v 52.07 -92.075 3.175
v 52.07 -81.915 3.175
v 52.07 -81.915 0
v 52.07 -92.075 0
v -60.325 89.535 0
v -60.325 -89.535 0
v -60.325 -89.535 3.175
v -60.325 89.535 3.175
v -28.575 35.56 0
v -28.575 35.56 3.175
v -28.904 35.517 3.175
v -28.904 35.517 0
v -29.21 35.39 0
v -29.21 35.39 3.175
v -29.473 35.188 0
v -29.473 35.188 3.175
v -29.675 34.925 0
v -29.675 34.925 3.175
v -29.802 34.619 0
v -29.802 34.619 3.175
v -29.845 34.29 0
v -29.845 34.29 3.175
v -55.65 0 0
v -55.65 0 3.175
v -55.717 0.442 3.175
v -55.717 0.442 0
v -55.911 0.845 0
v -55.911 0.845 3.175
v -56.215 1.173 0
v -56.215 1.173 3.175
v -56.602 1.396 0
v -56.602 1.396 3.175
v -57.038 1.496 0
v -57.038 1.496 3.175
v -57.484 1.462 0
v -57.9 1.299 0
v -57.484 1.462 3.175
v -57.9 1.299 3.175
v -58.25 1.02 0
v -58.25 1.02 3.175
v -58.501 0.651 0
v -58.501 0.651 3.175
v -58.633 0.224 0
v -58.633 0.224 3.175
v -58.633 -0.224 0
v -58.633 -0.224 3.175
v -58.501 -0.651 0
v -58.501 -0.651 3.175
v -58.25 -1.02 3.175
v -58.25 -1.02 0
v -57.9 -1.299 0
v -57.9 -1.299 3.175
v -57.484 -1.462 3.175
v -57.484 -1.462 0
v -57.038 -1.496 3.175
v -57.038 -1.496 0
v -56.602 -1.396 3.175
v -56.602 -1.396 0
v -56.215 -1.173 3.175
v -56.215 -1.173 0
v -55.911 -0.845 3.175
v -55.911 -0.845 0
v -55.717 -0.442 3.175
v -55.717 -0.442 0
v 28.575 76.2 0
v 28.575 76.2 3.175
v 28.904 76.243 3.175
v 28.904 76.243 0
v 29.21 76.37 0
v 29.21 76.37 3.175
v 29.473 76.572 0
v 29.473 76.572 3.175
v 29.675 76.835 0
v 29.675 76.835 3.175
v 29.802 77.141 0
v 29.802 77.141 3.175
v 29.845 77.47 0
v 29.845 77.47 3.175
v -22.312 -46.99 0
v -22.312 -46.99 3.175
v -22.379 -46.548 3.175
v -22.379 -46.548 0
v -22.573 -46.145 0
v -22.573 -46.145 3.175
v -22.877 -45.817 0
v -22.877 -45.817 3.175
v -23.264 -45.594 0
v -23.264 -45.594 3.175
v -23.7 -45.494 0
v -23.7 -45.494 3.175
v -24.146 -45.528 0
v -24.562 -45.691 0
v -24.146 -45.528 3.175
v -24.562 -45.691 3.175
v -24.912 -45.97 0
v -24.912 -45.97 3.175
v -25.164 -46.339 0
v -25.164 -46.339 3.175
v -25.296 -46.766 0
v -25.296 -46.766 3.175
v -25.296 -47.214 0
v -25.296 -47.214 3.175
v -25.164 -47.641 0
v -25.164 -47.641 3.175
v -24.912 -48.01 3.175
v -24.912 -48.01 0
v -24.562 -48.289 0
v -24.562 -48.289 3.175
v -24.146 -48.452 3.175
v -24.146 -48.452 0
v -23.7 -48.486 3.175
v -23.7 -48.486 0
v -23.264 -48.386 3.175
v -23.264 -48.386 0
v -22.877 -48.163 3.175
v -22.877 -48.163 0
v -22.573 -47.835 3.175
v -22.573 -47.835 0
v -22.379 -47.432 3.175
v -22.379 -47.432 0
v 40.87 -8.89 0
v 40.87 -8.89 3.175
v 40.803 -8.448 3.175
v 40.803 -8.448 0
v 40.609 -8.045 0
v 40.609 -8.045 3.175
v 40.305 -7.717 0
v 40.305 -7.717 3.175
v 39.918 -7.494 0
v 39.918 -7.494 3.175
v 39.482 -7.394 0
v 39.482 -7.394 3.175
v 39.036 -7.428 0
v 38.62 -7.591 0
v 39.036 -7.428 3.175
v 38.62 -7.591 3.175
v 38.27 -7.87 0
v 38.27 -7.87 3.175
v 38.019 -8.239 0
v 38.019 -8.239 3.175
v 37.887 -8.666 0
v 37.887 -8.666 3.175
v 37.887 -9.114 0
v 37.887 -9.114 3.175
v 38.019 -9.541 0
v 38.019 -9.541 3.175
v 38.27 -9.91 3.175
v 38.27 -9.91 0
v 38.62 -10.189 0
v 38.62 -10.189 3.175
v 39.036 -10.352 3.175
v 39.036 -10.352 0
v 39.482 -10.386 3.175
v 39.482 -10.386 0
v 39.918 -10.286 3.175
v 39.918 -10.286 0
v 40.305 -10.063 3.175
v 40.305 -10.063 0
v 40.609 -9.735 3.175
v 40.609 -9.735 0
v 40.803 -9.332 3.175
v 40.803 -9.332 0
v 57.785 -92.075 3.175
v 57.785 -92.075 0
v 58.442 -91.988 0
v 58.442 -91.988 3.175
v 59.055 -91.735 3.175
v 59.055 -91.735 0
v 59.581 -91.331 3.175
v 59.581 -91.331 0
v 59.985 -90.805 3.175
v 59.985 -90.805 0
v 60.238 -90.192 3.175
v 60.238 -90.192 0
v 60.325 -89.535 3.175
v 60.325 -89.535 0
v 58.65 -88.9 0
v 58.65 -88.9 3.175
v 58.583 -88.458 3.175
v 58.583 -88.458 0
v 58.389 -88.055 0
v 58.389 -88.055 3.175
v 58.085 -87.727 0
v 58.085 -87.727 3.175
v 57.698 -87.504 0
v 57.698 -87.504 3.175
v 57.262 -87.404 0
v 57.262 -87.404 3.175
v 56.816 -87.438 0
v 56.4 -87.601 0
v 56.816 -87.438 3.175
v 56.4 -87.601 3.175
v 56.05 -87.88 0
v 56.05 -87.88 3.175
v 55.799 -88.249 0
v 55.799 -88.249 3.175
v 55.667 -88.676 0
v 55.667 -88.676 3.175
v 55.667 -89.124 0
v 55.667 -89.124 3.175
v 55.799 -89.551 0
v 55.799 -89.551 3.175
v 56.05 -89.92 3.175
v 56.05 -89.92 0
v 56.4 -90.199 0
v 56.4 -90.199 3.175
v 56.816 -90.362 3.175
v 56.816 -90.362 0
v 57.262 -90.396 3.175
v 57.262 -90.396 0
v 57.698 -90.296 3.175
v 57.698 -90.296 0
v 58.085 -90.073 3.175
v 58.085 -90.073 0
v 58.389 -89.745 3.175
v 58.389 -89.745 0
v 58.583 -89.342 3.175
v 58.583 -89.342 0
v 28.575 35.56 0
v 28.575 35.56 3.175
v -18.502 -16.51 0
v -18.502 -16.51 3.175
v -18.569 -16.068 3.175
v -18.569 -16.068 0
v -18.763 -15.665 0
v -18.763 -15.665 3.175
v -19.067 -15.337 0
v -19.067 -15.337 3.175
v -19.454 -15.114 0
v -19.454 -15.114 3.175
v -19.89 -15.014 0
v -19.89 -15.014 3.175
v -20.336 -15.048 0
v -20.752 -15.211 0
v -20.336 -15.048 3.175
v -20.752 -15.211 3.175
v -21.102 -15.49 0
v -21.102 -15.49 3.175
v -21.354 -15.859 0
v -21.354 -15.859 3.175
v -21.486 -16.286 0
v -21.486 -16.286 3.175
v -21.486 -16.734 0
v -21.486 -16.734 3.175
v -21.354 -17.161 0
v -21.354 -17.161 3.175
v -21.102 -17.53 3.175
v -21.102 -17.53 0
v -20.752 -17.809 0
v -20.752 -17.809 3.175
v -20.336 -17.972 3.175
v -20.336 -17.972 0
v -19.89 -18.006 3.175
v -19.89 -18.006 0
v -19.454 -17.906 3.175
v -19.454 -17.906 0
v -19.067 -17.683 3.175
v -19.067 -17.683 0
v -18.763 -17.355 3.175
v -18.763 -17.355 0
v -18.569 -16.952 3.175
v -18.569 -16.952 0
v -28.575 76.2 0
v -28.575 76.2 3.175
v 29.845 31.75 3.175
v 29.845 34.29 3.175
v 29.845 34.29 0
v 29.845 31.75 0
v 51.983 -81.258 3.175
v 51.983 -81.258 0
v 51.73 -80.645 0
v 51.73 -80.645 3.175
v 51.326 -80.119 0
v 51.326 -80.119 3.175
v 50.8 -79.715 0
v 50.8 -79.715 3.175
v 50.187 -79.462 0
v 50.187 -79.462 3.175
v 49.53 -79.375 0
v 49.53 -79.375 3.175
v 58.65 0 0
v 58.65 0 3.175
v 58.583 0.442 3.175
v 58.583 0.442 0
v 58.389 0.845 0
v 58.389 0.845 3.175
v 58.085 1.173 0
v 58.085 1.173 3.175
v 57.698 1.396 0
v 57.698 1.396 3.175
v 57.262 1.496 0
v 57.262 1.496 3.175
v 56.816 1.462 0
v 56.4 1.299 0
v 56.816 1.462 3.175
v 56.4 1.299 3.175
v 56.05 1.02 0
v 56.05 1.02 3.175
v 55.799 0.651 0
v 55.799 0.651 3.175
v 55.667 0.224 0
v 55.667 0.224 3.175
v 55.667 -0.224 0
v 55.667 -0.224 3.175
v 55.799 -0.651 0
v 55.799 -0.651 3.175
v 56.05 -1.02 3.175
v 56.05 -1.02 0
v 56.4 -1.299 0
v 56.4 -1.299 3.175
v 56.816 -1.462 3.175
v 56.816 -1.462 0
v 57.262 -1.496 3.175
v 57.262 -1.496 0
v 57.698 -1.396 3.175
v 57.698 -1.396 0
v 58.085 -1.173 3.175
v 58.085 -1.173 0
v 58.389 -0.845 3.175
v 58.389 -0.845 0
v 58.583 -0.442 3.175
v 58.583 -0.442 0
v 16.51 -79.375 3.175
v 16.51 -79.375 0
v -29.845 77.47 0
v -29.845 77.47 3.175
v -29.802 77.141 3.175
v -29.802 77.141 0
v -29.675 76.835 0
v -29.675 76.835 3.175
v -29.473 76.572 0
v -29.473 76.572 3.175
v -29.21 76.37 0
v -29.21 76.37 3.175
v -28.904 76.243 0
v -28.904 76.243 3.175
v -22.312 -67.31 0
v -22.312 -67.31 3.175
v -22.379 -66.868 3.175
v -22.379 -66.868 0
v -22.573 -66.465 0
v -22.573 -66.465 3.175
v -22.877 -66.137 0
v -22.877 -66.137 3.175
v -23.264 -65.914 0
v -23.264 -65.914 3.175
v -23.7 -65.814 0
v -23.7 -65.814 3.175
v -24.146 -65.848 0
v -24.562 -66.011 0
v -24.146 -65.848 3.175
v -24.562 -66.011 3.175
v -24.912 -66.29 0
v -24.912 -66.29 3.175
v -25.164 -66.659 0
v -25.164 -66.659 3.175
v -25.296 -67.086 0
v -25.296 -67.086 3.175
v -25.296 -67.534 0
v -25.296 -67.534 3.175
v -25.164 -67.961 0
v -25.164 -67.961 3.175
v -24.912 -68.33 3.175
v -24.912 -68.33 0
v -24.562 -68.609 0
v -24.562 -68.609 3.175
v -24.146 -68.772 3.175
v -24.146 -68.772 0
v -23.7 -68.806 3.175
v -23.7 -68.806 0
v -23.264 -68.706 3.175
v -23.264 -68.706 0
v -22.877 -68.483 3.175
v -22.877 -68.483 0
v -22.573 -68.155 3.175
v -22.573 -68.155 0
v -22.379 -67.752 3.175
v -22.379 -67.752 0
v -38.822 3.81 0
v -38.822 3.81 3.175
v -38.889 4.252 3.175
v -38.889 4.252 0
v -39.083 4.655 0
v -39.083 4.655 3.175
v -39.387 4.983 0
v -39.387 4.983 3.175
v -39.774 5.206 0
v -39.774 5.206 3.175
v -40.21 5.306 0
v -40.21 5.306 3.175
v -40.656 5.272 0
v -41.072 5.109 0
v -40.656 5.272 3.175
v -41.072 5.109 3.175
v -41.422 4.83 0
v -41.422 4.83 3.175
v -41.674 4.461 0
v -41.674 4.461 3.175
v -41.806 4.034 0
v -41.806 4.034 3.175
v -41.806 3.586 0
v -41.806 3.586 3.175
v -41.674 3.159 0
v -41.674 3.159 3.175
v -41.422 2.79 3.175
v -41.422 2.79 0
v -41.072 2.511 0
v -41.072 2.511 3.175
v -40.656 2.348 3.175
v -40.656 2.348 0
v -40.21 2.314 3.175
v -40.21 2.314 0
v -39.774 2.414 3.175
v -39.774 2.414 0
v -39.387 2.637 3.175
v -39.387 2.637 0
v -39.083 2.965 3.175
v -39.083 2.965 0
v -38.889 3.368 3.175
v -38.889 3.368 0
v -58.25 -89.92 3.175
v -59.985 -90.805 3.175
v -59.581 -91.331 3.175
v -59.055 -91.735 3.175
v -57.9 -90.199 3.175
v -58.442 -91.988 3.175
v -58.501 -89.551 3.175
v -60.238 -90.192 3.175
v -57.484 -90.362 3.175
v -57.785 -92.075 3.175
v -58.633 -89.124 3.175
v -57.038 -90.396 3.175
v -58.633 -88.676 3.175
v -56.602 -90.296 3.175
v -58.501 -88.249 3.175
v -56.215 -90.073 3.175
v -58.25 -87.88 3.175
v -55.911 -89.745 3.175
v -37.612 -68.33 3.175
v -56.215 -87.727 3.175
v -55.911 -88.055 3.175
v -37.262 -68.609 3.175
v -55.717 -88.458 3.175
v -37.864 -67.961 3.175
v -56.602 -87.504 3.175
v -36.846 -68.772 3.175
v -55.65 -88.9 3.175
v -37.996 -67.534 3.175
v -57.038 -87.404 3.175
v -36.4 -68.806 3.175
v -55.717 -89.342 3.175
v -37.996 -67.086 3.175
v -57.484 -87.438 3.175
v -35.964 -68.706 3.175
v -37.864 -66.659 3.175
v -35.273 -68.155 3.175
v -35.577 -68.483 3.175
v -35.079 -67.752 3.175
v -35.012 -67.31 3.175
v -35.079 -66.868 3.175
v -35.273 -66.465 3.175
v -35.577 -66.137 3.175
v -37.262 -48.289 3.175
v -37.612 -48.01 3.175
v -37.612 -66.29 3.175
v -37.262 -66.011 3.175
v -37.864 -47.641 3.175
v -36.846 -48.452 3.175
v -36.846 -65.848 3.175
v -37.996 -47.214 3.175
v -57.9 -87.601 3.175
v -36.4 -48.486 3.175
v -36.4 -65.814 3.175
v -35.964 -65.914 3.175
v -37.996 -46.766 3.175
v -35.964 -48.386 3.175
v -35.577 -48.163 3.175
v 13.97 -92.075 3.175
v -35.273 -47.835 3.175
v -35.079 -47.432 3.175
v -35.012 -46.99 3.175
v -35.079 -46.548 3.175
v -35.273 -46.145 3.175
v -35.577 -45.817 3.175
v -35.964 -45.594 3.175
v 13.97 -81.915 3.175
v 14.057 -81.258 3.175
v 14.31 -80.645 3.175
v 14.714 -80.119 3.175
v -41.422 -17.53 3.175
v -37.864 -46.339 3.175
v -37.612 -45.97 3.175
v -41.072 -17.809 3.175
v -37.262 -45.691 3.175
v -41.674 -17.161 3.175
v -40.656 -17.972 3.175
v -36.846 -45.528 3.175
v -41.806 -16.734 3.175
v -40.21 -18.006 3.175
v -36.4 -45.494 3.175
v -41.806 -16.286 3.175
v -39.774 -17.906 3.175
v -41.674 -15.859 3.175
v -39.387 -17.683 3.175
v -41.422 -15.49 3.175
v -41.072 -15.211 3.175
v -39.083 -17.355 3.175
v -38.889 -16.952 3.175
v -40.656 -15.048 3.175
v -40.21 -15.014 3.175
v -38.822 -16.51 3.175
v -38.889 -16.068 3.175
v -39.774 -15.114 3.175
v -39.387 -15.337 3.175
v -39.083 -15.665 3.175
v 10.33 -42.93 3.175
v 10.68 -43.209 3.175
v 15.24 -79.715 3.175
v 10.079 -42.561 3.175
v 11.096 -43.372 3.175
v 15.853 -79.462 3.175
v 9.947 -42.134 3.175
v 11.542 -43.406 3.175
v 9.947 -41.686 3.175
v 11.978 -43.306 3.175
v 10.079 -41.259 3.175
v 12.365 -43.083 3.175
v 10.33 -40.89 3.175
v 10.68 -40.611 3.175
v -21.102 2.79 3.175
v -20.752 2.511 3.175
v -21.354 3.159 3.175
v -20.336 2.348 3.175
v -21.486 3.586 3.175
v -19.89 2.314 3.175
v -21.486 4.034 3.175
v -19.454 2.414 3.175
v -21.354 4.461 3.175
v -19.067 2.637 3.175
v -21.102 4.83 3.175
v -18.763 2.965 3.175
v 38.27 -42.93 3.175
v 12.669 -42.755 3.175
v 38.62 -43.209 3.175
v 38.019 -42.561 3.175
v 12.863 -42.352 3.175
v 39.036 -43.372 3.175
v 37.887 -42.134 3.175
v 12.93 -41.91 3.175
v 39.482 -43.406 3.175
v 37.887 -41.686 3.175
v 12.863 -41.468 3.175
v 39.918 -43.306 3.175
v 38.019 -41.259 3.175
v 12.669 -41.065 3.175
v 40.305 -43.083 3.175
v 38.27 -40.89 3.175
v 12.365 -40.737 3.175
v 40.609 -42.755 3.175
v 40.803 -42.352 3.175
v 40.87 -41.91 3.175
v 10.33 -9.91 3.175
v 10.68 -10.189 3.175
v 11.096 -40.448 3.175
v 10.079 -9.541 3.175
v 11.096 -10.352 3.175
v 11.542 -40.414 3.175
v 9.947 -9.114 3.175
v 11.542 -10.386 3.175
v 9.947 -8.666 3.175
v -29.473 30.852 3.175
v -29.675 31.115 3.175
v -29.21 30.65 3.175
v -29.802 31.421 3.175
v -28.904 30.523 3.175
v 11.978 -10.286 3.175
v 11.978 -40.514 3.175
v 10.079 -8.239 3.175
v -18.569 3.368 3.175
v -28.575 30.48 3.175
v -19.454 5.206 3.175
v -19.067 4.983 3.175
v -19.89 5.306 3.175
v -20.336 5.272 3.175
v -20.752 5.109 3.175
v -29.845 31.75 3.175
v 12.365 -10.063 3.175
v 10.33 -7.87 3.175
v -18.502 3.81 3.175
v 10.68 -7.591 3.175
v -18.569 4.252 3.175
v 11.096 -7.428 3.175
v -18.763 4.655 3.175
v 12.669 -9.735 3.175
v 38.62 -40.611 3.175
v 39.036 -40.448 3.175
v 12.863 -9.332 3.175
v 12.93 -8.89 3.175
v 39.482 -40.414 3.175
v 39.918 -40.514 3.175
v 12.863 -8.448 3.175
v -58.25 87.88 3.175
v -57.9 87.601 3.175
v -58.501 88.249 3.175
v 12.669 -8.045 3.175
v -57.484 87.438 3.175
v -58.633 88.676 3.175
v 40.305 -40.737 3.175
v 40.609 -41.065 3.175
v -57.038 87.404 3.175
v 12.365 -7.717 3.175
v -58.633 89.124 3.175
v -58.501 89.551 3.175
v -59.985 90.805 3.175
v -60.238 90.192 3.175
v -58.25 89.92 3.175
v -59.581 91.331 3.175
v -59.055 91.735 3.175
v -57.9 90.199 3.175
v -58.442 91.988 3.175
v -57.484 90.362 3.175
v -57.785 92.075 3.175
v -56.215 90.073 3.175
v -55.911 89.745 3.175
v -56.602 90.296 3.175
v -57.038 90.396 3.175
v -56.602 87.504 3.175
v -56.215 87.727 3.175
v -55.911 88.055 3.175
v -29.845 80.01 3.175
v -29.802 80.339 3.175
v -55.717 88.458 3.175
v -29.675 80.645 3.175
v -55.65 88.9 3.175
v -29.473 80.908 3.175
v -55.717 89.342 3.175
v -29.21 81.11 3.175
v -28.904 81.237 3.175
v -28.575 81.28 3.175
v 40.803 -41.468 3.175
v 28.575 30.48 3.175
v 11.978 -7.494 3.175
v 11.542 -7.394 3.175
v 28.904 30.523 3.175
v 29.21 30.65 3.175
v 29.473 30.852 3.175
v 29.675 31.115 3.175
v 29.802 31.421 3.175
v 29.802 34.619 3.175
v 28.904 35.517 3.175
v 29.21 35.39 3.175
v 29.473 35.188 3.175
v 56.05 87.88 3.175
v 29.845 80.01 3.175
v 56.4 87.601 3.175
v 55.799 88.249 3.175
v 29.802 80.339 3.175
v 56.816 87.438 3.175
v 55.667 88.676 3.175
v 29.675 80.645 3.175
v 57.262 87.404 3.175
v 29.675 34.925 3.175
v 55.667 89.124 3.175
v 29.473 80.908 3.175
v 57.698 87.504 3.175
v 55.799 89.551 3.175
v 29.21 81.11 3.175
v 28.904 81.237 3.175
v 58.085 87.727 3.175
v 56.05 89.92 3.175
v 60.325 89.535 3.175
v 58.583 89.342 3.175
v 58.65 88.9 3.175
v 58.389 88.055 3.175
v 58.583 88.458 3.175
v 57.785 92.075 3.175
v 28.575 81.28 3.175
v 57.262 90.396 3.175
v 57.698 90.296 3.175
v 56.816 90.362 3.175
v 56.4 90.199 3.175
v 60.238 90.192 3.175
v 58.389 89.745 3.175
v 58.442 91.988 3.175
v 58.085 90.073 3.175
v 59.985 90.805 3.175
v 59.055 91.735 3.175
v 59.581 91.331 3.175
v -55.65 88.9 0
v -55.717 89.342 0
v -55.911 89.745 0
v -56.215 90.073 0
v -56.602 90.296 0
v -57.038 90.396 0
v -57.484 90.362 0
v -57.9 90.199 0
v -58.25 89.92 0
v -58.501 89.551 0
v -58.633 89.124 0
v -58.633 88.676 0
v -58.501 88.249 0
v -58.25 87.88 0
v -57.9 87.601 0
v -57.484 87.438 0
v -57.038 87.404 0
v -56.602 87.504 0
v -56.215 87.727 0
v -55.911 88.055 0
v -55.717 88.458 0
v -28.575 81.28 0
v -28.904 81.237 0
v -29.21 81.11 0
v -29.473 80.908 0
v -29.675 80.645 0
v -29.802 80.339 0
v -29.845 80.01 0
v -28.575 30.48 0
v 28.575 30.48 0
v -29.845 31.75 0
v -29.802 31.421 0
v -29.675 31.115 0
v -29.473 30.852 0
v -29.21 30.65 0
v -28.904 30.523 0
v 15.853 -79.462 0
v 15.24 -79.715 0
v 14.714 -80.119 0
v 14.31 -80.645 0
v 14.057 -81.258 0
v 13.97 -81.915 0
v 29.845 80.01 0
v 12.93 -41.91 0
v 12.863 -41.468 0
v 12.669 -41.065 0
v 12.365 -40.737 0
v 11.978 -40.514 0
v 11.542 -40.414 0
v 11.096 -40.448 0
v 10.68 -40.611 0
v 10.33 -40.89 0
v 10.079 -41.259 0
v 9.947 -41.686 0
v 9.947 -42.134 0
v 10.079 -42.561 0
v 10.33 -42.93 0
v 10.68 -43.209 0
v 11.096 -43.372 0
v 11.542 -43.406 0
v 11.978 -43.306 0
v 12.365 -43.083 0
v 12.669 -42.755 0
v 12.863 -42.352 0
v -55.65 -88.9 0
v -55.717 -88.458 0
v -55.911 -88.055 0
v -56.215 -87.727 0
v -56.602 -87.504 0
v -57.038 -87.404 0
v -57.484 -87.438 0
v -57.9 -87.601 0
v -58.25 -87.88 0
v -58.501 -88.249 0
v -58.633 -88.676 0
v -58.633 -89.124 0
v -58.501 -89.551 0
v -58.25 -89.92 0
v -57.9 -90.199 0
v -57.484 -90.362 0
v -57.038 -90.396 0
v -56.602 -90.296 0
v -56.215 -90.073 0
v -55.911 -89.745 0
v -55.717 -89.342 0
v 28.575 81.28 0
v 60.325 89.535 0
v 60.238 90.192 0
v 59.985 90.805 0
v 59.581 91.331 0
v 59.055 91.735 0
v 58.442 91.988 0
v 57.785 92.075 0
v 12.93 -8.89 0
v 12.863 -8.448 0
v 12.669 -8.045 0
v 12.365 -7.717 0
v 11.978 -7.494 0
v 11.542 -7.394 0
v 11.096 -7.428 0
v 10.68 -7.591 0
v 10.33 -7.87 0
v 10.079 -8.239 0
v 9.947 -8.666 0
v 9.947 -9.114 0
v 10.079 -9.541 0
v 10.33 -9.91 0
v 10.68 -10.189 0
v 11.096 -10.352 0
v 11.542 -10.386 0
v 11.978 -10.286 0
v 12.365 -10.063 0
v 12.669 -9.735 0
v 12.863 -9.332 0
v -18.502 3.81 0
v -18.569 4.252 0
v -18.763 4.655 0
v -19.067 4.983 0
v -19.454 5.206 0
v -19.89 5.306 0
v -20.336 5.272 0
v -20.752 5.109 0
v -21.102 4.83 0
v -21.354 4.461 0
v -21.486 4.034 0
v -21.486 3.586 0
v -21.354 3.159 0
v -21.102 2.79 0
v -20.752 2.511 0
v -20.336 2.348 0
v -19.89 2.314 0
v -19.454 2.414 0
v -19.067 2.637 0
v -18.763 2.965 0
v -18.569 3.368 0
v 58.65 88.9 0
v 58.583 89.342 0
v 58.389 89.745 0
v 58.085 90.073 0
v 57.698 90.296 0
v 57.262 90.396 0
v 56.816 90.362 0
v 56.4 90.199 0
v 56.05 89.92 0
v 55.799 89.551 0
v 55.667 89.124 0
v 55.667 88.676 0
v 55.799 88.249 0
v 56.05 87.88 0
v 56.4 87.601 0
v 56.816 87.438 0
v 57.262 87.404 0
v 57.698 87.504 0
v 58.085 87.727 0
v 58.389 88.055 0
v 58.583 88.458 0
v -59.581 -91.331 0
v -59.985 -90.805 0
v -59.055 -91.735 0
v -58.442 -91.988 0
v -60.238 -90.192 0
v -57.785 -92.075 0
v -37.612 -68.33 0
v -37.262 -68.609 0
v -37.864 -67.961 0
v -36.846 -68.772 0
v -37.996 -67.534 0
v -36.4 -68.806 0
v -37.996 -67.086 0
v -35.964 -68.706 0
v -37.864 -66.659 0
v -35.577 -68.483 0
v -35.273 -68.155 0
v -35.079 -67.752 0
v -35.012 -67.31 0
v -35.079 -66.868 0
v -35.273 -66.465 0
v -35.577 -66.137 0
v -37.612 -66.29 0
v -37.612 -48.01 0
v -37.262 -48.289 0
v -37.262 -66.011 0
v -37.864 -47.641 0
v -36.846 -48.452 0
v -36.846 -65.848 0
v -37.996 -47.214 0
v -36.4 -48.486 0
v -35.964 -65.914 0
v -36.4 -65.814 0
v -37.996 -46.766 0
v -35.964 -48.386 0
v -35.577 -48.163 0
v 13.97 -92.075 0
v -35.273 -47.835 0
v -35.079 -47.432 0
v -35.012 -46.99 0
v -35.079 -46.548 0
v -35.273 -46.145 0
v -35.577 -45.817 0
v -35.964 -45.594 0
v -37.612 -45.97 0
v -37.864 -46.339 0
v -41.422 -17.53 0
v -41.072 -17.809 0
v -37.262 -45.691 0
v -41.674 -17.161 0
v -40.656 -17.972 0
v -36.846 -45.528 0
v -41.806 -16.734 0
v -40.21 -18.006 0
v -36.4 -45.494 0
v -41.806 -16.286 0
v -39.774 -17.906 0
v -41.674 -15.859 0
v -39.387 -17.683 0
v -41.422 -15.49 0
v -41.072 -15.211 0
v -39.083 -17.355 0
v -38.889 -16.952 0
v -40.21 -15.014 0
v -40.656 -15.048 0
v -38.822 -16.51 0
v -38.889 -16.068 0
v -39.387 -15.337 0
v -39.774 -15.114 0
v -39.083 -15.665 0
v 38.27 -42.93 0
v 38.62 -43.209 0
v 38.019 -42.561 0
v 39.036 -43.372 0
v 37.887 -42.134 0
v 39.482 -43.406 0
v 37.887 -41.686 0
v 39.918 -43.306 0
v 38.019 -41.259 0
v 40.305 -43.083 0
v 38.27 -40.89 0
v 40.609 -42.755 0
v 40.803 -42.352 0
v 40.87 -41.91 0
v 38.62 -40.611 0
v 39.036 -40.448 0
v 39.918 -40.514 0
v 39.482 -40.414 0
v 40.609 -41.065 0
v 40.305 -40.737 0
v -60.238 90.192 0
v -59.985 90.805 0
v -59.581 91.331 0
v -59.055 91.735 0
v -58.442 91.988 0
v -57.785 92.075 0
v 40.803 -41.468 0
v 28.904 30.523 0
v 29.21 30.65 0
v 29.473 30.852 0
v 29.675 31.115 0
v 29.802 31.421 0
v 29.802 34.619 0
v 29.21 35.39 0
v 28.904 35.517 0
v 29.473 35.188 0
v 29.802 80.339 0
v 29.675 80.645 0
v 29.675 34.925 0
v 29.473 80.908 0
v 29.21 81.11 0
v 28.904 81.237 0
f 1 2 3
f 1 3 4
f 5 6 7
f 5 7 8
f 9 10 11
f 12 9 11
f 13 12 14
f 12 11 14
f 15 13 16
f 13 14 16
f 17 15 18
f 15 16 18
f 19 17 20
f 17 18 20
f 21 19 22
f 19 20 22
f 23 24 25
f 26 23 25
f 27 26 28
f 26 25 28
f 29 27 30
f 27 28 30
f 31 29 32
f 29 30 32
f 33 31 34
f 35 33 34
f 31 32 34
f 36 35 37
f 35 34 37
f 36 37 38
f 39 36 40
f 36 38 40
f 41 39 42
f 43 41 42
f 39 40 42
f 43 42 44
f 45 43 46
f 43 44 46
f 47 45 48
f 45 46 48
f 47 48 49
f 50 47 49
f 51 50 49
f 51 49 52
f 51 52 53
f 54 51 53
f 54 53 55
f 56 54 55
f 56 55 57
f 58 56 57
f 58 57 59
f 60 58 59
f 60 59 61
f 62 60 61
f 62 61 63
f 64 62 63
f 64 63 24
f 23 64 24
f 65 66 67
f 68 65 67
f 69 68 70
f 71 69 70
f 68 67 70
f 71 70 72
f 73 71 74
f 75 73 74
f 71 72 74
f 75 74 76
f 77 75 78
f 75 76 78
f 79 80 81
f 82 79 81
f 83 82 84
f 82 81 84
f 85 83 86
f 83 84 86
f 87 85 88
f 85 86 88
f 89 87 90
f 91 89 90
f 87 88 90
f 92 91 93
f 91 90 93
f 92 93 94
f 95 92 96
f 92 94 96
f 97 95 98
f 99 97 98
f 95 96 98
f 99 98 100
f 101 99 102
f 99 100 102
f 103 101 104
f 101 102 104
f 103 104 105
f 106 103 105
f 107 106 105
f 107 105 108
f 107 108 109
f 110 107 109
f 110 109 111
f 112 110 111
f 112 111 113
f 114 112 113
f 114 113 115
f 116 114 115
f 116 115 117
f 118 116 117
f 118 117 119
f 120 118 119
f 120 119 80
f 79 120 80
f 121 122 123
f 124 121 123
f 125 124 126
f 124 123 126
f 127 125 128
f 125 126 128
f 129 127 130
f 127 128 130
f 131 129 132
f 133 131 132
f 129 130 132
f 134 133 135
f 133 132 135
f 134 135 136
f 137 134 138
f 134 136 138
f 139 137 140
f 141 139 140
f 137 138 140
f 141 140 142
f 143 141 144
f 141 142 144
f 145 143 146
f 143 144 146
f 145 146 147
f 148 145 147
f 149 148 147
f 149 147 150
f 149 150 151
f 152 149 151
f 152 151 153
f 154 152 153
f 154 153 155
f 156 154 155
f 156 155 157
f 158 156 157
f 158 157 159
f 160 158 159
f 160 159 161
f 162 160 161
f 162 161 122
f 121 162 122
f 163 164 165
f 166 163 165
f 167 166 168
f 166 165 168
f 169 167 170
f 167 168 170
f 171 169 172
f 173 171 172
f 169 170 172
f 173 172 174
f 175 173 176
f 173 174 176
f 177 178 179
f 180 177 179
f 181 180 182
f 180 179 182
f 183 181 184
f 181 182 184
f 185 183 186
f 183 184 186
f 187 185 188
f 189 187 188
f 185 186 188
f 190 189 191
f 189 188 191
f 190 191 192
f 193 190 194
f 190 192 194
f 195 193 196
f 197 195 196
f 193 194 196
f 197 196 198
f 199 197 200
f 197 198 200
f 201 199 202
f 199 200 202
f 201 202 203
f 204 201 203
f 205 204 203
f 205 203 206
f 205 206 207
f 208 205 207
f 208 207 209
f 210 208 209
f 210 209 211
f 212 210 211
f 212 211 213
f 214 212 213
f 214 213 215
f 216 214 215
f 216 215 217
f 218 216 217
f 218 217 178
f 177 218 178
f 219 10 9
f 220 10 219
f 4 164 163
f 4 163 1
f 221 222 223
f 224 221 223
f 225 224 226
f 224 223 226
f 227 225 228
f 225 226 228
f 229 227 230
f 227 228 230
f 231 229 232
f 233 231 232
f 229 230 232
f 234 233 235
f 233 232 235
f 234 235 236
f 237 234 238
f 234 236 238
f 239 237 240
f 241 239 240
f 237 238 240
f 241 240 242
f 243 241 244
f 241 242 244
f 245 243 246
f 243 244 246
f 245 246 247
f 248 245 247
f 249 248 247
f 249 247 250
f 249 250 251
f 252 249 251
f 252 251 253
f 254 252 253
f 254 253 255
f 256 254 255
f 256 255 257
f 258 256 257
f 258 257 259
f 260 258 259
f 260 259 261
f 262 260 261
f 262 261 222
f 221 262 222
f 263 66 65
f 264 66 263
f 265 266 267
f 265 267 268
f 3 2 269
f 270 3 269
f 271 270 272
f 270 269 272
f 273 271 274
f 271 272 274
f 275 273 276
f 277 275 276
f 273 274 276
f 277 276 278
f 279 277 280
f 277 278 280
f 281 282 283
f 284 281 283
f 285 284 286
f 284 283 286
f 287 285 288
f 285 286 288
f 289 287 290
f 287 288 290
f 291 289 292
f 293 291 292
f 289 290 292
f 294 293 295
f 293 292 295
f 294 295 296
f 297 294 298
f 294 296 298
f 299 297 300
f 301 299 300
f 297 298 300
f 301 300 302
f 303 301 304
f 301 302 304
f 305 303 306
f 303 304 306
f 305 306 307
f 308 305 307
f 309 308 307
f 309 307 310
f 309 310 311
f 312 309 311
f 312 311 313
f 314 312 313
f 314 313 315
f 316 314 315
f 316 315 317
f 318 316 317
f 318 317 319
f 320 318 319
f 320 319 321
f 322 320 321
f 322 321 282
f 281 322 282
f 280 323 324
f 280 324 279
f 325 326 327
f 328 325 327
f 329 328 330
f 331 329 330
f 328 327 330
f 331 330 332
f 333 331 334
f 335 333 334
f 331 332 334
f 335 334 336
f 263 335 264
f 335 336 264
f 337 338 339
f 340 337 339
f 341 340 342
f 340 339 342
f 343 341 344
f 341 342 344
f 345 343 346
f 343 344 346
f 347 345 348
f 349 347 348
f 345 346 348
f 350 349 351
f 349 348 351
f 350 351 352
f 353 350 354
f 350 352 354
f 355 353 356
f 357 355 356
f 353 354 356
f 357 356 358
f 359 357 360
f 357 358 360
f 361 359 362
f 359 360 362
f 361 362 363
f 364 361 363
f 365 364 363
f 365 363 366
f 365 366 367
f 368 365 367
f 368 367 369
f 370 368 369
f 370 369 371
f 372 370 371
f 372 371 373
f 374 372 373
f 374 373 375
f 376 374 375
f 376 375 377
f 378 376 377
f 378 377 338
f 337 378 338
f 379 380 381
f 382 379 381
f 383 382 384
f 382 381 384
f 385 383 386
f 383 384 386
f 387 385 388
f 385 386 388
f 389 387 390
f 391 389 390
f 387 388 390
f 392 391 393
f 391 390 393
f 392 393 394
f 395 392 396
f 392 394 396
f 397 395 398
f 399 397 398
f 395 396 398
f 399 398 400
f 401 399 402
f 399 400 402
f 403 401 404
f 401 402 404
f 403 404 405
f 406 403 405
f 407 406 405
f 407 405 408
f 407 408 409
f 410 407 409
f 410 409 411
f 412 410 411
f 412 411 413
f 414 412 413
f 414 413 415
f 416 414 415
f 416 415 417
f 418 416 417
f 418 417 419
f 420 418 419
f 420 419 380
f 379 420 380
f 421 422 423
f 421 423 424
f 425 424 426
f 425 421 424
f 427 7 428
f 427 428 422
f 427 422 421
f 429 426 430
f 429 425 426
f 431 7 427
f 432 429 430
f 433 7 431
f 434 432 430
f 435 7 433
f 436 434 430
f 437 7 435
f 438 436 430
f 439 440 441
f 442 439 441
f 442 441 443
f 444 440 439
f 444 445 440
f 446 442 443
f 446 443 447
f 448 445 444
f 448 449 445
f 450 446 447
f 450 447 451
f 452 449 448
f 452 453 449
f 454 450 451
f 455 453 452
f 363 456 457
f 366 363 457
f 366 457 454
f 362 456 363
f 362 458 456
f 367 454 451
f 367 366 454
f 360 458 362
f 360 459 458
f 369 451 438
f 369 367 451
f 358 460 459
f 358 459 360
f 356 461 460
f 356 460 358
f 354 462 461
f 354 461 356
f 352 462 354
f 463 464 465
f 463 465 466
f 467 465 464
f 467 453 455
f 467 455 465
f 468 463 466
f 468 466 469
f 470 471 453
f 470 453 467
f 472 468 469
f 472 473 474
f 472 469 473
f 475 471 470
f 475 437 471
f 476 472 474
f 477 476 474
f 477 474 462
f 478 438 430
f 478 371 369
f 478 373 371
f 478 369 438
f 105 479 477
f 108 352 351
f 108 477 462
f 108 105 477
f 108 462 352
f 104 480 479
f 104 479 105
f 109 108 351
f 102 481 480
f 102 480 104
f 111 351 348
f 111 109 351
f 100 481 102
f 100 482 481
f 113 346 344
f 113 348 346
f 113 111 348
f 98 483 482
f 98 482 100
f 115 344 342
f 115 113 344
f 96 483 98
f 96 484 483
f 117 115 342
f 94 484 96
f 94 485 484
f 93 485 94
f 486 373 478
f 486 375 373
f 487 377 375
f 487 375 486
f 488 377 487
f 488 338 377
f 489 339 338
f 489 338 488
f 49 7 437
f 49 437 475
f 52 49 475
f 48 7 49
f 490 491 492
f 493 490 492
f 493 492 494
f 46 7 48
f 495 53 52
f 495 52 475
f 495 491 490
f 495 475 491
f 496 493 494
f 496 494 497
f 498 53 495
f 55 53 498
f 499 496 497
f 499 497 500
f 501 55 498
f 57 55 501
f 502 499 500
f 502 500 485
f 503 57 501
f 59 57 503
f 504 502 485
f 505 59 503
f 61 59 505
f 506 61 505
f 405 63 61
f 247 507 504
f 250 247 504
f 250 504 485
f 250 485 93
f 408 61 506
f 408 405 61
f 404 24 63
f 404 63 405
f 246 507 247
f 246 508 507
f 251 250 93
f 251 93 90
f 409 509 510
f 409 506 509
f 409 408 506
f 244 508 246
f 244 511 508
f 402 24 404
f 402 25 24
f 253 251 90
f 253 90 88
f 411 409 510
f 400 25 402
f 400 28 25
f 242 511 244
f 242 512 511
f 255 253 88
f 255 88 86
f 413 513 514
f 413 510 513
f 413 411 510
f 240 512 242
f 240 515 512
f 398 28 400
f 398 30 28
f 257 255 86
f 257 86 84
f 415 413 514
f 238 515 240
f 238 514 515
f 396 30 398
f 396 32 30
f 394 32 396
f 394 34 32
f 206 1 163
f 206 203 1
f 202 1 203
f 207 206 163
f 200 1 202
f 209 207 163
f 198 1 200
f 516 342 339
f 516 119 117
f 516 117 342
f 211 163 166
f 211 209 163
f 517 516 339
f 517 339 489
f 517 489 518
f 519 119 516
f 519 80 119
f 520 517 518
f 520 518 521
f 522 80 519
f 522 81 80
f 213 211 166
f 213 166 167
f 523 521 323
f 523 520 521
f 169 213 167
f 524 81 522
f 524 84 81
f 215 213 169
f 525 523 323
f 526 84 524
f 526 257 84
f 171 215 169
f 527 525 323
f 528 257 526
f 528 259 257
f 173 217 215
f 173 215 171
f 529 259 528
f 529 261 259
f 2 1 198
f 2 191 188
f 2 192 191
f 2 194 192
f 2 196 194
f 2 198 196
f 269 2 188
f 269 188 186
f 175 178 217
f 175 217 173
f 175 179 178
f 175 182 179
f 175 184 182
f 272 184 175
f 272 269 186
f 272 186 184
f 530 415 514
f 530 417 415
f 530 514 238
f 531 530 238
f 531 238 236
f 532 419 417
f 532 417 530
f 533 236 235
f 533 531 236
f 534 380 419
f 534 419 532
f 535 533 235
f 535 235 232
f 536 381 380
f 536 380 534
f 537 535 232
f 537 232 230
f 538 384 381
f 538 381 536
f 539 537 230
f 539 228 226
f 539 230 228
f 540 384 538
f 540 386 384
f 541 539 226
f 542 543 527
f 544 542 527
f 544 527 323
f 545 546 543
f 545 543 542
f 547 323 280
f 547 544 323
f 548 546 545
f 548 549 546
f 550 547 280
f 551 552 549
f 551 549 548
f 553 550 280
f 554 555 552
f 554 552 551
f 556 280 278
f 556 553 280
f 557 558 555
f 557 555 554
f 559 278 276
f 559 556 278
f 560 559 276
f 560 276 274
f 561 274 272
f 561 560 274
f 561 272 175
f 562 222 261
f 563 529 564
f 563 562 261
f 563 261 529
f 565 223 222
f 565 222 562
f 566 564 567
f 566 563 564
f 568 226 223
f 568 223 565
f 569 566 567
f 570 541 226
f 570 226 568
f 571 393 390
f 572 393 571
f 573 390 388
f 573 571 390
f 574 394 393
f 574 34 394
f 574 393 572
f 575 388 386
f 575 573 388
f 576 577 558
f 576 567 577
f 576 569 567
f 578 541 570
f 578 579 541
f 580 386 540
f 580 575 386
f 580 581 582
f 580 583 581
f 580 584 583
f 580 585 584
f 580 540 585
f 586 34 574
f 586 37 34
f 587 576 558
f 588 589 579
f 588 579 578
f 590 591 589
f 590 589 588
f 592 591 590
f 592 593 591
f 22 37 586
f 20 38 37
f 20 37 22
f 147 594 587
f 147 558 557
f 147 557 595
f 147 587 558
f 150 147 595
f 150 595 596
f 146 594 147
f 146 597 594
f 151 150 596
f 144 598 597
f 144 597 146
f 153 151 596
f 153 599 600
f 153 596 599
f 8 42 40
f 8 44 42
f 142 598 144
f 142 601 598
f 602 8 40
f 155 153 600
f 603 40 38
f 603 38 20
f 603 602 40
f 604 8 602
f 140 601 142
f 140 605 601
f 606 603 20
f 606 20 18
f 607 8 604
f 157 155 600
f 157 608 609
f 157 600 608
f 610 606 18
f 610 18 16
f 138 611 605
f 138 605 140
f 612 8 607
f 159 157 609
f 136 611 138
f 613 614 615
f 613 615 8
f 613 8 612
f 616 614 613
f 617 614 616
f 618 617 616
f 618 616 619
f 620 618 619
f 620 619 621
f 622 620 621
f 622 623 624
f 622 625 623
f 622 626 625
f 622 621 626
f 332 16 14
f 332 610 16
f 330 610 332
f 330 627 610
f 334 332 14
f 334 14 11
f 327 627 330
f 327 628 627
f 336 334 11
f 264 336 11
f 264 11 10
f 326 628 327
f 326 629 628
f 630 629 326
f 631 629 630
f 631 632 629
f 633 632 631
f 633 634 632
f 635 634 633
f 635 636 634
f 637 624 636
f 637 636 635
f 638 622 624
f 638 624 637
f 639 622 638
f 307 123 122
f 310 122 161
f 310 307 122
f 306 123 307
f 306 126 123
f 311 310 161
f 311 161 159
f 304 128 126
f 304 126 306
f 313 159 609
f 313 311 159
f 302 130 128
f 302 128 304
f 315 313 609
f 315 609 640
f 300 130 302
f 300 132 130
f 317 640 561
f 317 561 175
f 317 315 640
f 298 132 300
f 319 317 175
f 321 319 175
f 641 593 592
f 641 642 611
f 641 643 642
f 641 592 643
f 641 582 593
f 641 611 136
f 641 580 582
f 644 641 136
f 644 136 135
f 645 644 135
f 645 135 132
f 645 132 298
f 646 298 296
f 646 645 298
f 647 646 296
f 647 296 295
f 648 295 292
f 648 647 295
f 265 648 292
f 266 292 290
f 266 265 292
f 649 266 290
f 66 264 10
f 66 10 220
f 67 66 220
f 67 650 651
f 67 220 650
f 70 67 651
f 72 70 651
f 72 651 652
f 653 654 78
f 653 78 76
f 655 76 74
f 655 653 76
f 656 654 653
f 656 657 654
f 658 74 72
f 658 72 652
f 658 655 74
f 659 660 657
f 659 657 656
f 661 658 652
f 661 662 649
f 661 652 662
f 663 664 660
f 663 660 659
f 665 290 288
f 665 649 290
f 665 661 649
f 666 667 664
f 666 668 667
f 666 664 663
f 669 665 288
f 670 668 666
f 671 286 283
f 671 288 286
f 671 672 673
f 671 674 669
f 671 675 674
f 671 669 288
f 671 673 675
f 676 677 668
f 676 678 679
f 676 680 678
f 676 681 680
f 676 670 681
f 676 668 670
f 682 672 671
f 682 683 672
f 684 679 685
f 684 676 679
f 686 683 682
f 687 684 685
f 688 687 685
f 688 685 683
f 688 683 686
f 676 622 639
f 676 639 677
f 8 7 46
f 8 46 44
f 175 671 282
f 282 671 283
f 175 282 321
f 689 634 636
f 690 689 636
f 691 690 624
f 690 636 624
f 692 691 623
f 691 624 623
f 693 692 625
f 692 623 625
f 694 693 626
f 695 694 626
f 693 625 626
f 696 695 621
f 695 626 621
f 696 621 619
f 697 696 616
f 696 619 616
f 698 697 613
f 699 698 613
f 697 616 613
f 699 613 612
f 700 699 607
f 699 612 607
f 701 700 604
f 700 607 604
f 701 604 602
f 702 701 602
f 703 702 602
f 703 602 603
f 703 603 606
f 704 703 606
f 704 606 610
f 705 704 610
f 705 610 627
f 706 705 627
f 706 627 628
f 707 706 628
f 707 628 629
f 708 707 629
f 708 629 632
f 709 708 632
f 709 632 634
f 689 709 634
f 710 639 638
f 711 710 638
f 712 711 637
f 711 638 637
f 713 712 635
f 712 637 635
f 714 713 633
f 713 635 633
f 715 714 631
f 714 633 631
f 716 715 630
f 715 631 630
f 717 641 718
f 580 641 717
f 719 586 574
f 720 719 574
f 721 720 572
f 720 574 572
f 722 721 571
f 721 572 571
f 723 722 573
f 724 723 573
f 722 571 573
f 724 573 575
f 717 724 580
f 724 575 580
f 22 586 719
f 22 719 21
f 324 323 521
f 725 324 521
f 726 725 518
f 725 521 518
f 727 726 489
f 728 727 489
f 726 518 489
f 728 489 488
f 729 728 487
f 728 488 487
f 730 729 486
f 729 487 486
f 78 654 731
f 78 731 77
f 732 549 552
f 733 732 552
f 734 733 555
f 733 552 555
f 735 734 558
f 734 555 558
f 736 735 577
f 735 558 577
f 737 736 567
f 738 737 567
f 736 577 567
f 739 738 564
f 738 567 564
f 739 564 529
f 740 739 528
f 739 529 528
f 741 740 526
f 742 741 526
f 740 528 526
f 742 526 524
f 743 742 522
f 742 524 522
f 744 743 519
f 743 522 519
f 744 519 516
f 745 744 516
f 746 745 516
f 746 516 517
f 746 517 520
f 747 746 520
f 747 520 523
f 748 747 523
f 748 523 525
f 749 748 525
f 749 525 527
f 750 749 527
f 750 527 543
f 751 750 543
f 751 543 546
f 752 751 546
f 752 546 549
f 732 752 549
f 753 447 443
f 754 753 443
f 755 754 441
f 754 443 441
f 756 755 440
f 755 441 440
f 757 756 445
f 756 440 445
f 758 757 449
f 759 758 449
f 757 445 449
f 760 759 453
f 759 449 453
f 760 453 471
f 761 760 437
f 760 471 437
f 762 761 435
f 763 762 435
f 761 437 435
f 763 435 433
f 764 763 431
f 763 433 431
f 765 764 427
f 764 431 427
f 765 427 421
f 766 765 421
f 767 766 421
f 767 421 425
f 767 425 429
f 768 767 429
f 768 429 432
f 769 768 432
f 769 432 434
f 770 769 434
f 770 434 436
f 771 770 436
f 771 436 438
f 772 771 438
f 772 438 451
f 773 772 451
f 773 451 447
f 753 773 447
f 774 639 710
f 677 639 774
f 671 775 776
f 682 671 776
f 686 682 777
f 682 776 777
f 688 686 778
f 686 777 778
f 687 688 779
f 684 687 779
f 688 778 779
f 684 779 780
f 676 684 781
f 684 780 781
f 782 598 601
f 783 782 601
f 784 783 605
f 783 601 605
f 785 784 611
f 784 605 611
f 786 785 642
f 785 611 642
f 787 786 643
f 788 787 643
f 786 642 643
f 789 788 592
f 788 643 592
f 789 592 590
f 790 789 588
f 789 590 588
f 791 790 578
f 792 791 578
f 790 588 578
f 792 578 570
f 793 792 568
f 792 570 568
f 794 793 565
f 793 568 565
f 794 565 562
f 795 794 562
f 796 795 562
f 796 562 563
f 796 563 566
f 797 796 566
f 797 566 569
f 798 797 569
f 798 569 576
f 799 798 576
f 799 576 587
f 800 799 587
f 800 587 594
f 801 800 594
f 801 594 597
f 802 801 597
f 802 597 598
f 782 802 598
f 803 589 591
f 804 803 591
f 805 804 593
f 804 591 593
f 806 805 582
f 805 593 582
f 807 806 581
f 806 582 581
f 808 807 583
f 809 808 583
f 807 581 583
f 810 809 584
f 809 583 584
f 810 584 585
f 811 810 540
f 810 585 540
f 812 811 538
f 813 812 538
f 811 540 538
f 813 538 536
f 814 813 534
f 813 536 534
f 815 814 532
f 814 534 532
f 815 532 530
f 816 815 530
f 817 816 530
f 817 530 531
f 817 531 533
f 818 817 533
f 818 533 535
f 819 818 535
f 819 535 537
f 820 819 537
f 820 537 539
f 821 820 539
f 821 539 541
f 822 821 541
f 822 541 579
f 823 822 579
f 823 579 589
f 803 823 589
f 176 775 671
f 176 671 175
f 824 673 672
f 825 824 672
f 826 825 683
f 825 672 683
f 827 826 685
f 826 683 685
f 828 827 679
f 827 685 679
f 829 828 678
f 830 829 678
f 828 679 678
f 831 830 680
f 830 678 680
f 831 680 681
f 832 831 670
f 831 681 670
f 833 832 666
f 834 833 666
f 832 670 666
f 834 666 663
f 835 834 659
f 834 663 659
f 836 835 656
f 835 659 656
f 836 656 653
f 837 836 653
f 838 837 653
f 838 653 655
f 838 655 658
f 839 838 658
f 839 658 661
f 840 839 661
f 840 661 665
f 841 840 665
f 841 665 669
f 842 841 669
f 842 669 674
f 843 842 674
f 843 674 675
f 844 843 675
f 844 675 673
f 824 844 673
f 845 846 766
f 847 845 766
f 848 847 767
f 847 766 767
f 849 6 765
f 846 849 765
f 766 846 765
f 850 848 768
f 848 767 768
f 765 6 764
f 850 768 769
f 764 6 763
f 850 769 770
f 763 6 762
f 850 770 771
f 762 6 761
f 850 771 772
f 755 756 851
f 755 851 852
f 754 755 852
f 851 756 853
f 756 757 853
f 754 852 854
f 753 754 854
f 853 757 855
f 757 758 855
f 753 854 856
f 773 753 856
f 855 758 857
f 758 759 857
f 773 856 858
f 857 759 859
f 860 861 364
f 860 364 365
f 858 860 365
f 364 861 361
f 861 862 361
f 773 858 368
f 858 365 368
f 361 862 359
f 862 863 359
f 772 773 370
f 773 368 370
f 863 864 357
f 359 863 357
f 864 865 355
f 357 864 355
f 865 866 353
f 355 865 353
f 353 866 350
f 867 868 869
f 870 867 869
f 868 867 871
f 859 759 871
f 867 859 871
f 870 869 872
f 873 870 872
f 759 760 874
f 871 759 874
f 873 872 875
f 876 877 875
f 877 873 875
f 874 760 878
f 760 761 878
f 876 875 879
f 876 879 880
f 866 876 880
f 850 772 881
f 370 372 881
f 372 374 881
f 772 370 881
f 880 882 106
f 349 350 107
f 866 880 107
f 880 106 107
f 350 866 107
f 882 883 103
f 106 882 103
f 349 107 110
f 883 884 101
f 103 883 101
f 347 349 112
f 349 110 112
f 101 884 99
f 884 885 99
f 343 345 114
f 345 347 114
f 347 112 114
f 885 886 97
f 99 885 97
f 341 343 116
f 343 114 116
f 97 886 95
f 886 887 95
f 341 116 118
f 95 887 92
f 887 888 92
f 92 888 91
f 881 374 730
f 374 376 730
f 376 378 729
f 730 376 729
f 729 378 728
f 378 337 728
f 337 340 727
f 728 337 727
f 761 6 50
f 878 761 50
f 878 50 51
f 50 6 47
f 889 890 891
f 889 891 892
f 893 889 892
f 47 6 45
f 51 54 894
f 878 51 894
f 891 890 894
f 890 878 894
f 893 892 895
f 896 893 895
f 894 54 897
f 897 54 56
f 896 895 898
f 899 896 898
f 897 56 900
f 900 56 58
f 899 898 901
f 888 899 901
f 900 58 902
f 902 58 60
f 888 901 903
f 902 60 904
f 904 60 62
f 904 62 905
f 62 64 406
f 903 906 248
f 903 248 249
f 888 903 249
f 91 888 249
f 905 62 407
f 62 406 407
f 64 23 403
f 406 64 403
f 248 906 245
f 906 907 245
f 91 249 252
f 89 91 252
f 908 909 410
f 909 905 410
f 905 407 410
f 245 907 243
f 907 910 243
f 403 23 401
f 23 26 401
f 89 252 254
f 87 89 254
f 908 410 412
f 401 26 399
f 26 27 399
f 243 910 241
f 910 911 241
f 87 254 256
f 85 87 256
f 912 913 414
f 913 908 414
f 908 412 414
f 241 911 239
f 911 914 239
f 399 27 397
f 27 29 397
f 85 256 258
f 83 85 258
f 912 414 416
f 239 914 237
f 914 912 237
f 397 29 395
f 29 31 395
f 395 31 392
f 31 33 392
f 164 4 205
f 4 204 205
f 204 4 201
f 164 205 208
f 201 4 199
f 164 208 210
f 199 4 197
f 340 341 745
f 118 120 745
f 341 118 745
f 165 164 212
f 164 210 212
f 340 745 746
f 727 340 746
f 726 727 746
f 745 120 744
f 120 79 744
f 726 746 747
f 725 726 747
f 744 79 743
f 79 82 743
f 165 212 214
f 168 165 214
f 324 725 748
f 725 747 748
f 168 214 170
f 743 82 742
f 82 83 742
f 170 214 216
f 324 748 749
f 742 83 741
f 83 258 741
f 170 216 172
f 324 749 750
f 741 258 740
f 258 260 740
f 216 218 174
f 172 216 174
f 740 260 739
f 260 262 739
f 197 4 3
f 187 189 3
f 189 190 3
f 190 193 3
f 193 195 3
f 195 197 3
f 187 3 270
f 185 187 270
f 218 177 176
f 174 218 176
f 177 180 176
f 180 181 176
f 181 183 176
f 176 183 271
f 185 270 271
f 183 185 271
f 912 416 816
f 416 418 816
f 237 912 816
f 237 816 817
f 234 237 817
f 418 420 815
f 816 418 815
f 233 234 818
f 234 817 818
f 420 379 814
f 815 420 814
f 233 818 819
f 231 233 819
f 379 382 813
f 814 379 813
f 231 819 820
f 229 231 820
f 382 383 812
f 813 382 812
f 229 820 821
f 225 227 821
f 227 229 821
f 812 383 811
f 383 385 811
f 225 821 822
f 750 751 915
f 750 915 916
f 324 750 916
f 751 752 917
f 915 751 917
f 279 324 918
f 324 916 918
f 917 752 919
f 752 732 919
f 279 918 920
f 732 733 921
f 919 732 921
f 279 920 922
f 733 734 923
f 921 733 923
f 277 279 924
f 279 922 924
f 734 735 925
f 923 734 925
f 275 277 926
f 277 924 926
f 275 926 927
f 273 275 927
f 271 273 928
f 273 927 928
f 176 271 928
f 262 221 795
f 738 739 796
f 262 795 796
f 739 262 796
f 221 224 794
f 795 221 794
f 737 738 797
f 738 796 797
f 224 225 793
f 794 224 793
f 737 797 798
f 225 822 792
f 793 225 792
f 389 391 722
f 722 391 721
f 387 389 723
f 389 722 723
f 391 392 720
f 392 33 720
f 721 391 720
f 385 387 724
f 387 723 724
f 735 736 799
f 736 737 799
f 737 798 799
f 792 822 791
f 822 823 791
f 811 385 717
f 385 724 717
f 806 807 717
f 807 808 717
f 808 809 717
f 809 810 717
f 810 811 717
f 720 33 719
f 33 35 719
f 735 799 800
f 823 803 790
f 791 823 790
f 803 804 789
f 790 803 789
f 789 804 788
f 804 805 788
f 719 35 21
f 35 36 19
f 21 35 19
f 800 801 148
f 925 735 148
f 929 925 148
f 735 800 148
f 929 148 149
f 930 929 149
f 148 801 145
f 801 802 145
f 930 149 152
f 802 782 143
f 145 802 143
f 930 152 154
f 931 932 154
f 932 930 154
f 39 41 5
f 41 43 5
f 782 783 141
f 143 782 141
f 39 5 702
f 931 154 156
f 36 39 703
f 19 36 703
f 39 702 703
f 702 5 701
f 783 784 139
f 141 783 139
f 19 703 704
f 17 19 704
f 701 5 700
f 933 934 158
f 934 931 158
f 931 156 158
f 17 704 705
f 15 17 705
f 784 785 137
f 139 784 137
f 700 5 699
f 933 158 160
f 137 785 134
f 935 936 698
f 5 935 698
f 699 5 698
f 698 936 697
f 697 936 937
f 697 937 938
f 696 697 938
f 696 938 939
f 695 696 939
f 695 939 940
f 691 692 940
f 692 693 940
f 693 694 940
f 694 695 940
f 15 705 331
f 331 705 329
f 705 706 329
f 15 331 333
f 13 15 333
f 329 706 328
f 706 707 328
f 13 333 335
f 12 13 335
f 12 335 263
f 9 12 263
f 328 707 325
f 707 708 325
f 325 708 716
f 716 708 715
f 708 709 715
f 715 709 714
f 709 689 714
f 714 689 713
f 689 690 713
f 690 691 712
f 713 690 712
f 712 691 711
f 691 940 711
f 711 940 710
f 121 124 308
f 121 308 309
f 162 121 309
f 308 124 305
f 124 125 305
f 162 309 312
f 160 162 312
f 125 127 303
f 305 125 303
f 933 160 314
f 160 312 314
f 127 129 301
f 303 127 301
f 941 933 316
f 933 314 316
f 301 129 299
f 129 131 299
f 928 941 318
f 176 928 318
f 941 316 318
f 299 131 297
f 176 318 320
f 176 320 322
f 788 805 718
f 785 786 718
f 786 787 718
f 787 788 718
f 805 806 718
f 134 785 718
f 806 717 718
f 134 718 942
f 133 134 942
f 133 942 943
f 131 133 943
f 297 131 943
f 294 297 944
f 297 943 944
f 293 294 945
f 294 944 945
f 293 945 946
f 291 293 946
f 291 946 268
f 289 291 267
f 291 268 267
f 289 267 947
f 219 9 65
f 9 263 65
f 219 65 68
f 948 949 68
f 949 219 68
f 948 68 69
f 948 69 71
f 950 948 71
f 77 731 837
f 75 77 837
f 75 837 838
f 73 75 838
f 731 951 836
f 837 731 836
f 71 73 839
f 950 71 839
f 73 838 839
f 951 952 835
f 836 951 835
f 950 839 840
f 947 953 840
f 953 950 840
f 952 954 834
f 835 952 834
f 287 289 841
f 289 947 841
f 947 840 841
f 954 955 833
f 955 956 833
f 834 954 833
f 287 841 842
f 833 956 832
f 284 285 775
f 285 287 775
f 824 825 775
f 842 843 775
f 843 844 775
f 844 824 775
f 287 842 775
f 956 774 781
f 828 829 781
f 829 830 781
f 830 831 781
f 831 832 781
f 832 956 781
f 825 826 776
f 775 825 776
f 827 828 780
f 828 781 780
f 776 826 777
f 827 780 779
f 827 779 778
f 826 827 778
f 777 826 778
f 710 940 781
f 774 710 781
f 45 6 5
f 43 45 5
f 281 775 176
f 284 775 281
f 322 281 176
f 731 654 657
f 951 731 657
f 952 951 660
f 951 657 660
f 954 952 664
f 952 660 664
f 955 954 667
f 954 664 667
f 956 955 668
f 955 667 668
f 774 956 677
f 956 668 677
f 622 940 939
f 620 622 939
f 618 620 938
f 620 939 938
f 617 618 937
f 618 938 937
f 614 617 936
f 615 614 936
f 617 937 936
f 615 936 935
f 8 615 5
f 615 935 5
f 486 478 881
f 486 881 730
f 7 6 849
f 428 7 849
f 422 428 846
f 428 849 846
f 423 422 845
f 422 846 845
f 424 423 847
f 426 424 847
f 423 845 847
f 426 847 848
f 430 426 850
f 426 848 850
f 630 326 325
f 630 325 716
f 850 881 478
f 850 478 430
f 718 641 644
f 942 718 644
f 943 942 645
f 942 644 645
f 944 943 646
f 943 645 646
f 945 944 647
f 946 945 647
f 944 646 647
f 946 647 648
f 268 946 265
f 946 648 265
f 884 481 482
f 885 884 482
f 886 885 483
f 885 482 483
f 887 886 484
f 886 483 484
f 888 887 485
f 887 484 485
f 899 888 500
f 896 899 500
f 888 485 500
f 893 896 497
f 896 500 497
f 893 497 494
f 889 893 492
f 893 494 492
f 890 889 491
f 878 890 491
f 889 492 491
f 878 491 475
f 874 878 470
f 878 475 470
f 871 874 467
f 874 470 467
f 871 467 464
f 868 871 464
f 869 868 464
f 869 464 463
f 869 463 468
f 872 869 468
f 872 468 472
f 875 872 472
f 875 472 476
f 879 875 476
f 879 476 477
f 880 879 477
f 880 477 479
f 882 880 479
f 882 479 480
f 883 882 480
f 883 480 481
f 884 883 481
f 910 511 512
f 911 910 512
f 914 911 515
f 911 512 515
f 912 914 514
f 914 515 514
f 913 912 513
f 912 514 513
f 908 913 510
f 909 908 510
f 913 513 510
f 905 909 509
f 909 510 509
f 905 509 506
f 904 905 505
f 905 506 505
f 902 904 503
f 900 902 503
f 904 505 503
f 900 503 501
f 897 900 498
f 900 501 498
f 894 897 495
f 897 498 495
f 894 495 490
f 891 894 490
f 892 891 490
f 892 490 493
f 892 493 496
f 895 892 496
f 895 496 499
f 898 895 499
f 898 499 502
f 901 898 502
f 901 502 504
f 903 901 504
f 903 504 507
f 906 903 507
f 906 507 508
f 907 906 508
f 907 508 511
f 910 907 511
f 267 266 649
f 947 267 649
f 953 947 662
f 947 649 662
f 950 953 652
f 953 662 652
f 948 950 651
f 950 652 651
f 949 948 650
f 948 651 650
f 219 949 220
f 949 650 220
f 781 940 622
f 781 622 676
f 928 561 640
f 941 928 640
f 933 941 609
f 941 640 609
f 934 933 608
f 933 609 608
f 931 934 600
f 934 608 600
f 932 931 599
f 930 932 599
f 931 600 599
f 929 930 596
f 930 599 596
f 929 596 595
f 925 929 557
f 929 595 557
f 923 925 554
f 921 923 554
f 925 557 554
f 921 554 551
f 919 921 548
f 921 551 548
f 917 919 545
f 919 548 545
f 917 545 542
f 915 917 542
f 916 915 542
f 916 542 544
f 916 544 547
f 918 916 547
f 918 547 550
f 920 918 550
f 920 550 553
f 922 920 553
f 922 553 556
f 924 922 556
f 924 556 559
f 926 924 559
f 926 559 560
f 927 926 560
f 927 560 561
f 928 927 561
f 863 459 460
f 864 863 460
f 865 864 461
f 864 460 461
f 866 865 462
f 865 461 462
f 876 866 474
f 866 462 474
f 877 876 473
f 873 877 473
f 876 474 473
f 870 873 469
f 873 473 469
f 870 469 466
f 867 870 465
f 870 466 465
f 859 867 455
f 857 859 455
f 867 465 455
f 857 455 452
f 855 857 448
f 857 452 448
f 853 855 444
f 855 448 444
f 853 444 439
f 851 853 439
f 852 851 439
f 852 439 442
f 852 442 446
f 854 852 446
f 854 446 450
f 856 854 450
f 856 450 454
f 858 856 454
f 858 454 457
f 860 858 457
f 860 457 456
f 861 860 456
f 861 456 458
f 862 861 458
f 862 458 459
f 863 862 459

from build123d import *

# Parameters (mm, degrees)
PAD_DEPTH       = 3.175
SKETCH001_R     = 1.5
POCKET_DEPTH    = 3.176
POCKET001_DEPTH = 3.176
SKETCH003_R     = 1.5
POCKET002_DEPTH = 5
POCKET003_DEPTH = 3.176
SKETCH005_R     = 1.5
POCKET004_DEPTH = 3.176
SKETCH006_R     = 1.5
POCKET005_DEPTH = 3.176


with BuildPart() as part:
    # Sketch → Pad (new body)
    with BuildSketch(Plane.XY):
        with BuildLine():
            ThreePointArc((-57.785, 92.075), (-59.581051, 91.331051), (-60.325, 89.535))
            Line((-60.325, -89.535), (-60.325, 89.535))
            ThreePointArc((-60.325, -89.535), (-59.581051, -91.331051), (-57.785, -92.075))
            Line((57.785, -92.075), (-57.785, -92.075))
            ThreePointArc((57.785, -92.075), (59.581051, -91.331051), (60.325, -89.535))
            Line((60.325, 89.535), (60.325, -89.535))
            ThreePointArc((60.325, 89.535), (59.581051, 91.331051), (57.785, 92.075))
            Line((-57.785, 92.075), (57.785, 92.075))
        make_face()
    extrude(amount=PAD_DEPTH)

    # Sketch001 (on DatumPlane) → Pocket (cut, through all)
    with BuildSketch(Plane.XY.offset(3.175)):
        with Locations((-57.15, 88.9)):
            Circle(SKETCH001_R)
        with Locations((57.15, 88.9)):
            Circle(SKETCH001_R)
        with Locations((-57.15, -88.9)):
            Circle(SKETCH001_R)
        with Locations((57.15, -88.9)):
            Circle(SKETCH001_R)
        with Locations((-57.15, 0)):
            Circle(SKETCH001_R)
        with Locations((57.15, 0)):
            Circle(SKETCH001_R)
    extrude(amount=-POCKET_DEPTH, mode=Mode.SUBTRACT)

    # Sketch002 (on DatumPlane) → Pocket001 (cut, through all)
    with BuildSketch(Plane.XY.offset(3.175)):
        with BuildLine():
            ThreePointArc((-28.575, 81.28), (-29.473026, 80.908026), (-29.845, 80.01))
            Line((-29.845, 77.47), (-29.845, 80.01))
            ThreePointArc((-29.845, 77.47), (-29.473026, 76.571974), (-28.575, 76.2))
            Line((28.575, 76.2), (-28.575, 76.2))
            ThreePointArc((28.575, 76.2), (29.473026, 76.571974), (29.845, 77.47))
            Line((29.845, 80.01), (29.845, 77.47))
            ThreePointArc((29.845, 80.01), (29.473026, 80.908026), (28.575, 81.28))
            Line((-28.575, 81.28), (28.575, 81.28))
        make_face()
        with BuildLine():
            ThreePointArc((-28.575, 35.56), (-29.473026, 35.188026), (-29.845, 34.29))
            Line((-29.845, 31.75), (-29.845, 34.29))
            ThreePointArc((-29.845, 31.75), (-29.473026, 30.851974), (-28.575, 30.48))
            Line((28.575, 30.48), (-28.575, 30.48))
            ThreePointArc((28.575, 30.48), (29.473026, 30.851974), (29.845, 31.75))
            Line((29.845, 34.29), (29.845, 31.75))
            ThreePointArc((29.845, 34.29), (29.473026, 35.188026), (28.575, 35.56))
            Line((-28.575, 35.56), (28.575, 35.56))
        make_face()
    extrude(amount=-POCKET001_DEPTH, mode=Mode.SUBTRACT)

    # Sketch003 (on DatumPlane) → Pocket002 (cut)
    with BuildSketch(Plane.XY.offset(3.175)):
        with Locations((11.43, -8.89)):
            Circle(SKETCH003_R)
        with Locations((39.37, -8.89)):
            Circle(SKETCH003_R)
        with Locations((11.43, -41.91)):
            Circle(SKETCH003_R)
        with Locations((39.37, -41.91)):
            Circle(SKETCH003_R)
    extrude(amount=-POCKET002_DEPTH, mode=Mode.SUBTRACT)

    # Sketch004 (on DatumPlane) → Pocket003 (cut, through all)
    with BuildSketch(Plane.XY.offset(3.175)):
        with BuildLine():
            Line((13.97, -92.075), (13.97, -81.915))
            ThreePointArc((16.51, -79.375), (14.713949, -80.118949), (13.97, -81.915))
            Line((16.51, -79.375), (49.53, -79.375))
            ThreePointArc((52.07, -81.915), (51.326051, -80.118949), (49.53, -79.375))
            Line((52.07, -81.915), (52.07, -92.075))
            Line((52.07, -92.075), (52.07, -95.885))
            ThreePointArc((49.53, -98.425), (51.326051, -97.681051), (52.07, -95.885))
            Line((49.53, -98.425), (16.51, -98.425))
            ThreePointArc((13.97, -95.885), (14.713949, -97.681051), (16.51, -98.425))
            Line((13.97, -95.885), (13.97, -92.075))
        make_face()
    extrude(amount=-POCKET003_DEPTH, mode=Mode.SUBTRACT)

    # Sketch005 (on DatumPlane) → Pocket004 (cut, through all)
    with BuildSketch(Plane.XY.offset(3.175)):
        with Locations((-40.3225, 3.81)):
            Circle(SKETCH005_R)
        with Locations((-20.0025, 3.81)):
            Circle(SKETCH005_R)
        with Locations((-40.3225, -16.51)):
            Circle(SKETCH005_R)
        with Locations((-20.0025, -16.51)):
            Circle(SKETCH005_R)
    extrude(amount=-POCKET004_DEPTH, mode=Mode.SUBTRACT)

    # Sketch006 (on DatumPlane) → Pocket005 (cut, through all)
    with BuildSketch(Plane.XY.offset(3.175)):
        with Locations((-36.5125, -46.99)):
            Circle(SKETCH006_R)
        with Locations((-23.8125, -46.99)):
            Circle(SKETCH006_R)
        with Locations((-36.5125, -67.31)):
            Circle(SKETCH006_R)
        with Locations((-23.8125, -67.31)):
            Circle(SKETCH006_R)
    extrude(amount=-POCKET005_DEPTH, mode=Mode.SUBTRACT)


solid = part.part
